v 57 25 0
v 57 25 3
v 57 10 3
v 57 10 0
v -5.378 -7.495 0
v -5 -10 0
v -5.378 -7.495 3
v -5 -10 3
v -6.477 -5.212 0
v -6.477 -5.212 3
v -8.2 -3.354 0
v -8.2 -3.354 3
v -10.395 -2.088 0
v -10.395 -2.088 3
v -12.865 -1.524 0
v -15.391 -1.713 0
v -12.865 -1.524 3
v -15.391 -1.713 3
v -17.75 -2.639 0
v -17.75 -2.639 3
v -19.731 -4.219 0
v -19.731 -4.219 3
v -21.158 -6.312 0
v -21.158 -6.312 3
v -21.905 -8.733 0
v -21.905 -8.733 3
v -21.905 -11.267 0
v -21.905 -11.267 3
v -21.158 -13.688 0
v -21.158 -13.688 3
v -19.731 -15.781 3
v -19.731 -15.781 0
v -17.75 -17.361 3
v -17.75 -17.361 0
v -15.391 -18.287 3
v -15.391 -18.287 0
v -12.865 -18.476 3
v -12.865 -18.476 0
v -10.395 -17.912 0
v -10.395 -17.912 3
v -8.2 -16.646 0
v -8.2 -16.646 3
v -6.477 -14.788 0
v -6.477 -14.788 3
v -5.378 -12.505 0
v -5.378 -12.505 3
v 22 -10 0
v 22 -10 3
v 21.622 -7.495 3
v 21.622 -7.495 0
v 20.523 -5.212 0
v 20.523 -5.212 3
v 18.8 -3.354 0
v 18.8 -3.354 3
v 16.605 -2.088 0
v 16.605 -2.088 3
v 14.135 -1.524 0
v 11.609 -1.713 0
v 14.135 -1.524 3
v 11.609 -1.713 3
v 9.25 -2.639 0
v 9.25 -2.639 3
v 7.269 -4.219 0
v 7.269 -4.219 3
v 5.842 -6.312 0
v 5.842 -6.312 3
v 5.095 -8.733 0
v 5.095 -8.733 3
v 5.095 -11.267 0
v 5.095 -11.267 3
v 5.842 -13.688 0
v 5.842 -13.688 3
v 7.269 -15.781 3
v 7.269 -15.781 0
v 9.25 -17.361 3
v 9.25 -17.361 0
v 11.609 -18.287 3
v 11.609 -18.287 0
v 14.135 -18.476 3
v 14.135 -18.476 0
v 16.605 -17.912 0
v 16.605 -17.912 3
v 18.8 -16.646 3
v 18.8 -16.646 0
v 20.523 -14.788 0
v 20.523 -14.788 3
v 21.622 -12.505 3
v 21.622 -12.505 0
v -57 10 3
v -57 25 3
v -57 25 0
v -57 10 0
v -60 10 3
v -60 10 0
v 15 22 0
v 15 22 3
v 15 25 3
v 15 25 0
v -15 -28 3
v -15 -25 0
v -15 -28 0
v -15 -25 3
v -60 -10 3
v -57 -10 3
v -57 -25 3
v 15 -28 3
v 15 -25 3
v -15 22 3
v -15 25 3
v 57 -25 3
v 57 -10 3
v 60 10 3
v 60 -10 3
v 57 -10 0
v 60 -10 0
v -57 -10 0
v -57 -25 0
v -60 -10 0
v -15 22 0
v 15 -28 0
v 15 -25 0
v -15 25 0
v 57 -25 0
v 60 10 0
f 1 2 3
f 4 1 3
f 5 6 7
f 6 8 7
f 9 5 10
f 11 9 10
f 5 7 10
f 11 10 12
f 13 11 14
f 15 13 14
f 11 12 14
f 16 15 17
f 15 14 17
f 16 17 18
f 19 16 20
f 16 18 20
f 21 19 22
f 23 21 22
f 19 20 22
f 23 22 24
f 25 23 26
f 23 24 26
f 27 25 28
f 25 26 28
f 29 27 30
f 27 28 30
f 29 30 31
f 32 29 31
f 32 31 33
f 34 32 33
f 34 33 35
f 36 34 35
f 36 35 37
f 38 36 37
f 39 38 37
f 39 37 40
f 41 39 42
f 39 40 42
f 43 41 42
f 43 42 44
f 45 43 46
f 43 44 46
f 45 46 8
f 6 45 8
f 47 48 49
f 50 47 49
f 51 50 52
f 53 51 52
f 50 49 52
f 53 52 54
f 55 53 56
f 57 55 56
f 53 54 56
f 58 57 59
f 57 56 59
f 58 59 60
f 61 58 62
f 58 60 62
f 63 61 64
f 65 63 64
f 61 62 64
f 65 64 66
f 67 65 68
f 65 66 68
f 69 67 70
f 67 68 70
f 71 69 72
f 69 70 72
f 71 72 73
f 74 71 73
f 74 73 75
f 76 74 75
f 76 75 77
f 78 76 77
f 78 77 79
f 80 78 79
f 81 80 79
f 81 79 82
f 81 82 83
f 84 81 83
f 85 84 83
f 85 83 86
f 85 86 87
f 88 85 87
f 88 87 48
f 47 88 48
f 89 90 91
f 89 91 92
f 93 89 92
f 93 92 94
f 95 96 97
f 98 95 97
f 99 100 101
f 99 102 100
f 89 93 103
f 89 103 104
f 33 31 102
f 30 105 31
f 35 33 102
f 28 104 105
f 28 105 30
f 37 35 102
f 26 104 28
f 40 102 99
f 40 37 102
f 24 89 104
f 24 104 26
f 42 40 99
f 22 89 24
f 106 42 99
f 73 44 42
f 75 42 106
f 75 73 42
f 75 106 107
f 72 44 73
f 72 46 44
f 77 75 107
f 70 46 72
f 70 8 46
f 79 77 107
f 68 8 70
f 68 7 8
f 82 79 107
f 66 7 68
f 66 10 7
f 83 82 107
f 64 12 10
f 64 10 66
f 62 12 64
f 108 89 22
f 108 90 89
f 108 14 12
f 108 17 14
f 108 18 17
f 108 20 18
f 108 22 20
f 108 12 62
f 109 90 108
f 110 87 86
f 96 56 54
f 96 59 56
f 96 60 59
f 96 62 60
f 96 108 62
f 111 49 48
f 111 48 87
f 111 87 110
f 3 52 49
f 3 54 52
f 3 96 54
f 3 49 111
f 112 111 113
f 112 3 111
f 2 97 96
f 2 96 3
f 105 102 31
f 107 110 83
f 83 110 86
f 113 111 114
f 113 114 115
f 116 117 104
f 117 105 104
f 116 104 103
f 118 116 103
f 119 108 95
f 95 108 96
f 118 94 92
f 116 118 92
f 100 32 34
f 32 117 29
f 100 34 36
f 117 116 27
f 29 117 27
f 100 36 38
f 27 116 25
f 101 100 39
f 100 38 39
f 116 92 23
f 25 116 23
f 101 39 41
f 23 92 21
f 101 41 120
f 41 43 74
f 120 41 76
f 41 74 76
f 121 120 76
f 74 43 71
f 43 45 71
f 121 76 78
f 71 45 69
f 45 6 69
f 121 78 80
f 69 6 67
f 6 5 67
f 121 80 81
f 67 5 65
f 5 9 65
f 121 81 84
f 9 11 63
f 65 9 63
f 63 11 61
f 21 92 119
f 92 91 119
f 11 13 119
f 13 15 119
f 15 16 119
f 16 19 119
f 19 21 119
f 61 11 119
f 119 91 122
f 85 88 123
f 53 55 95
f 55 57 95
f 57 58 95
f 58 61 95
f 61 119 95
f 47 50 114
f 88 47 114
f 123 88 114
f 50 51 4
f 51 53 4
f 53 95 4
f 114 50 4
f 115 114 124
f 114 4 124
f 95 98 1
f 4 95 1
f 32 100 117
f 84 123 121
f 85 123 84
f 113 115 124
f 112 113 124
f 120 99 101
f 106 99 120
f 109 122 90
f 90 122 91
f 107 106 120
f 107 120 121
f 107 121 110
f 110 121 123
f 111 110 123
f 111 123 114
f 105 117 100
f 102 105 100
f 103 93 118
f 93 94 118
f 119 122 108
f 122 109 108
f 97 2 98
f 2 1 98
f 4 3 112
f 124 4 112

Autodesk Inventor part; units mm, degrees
ref_plane "YZ Plane" through (0, 0, 0) normal (1, 0, 0) x (0, 1, 0)
ref_plane "XZ Plane" through (0, 0, 0) normal (0, 1, 0) x (-1, 0, 0)
ref_plane "XY Plane" through (0, 0, 0) normal (0, 0, 1) x (1, 0, 0)
sketch "스케치1" plane through (0, 0, 0) normal (0, 0, 1) x (1, 0, 0)
  line L0 (-60, -25) -> (60, -25)
  line L1 (60, -25) -> (60, 25)
  line L2 (60, 25) -> (-60, 25)
  line L3 (-60, 25) -> (-60, -25)
  line L4 (-60, -25) -> (60, 25) construction
  line L5 (60, -25) -> (-60, 25) construction
  point P0 (0, 0)
  dimension "d0" = 120
  dimension "d1" = 50
extrude "돌출1" add sketch "스케치1" along normal blind 3
sketch "스케치2" plane through (0, 0, 3) normal (0, 0, 1) x (1, 0, 0)
  line L0 (60, 25) -> (-60, 25) projected
  line L1 (60, 25) -> (57, 25)
  line L2 (57, 25) -> (57, 10)
  line L3 (57, 10) -> (60, 10)
  line L4 (60, 10) -> (60, 25)
  line L5 (-60, 0) -> (60, 0)
  line L6 (60, -25) -> (60, 25) projected
  line L7 (0, 25) -> (0, -25)
  line L8 (-60, -25) -> (60, -25) projected
  line L9 (60, -25) -> (57, -25)
  line L10 (57, -25) -> (57, -10)
  line L11 (57, -10) -> (60, -10)
  line L12 (60, -10) -> (60, -25)
  line L13 (-60, 25) -> (-57, 25)
  line L14 (-57, 25) -> (-57, 10)
  line L15 (-57, 10) -> (-60, 10)
  line L16 (-60, 10) -> (-60, 25)
  line L17 (-60, -25) -> (-57, -25)
  line L18 (-57, -25) -> (-57, -10)
  line L19 (-57, -10) -> (-60, -10)
  line L20 (-60, -10) -> (-60, -25)
  point P0 (0, 0)
  dimension "d4" = 3
  dimension "d5" = 15
extrude "돌출2" cut sketch "스케치2" against normal through all contours L4 L3 L2 L0 | L8 L20 L19 L18 | L14 L15 L16 L0 | L6 L8 L10 L11
sketch "스케치3" plane through (0, 0, 3) normal (0, 0, 1) x (1, 0, 0)
  line L0 (-15, 22) -> (15, 22)
  line L1 (15, 22) -> (15, 28)
  line L2 (15, 28) -> (-15, 28)
  line L3 (-15, 28) -> (-15, 22)
  line L4 (57, 25) -> (-57, 25) projected
  line L5 (-15, 22) -> (15, 28) construction
  line L6 (15, 22) -> (-15, 28) construction
  point P0 (0, 0)
  point P1 (0, 25)
  point P2 (15, 25)
  point P3 (-15, 25)
  dimension "d8" = 30
  dimension "d9" = 3
extrude "돌출3" cut sketch "스케치3" against normal through all contours L3 L4 L1 L0
sketch "스케치4" plane through (0, 0, 3) normal (0, 0, 1) x (1, 0, 0)
  line L0 (-15, -28) -> (15, -28)
  line L1 (15, -28) -> (15, -22)
  line L2 (15, -22) -> (-15, -22)
  line L3 (-15, -22) -> (-15, -28)
  line L4 (-57, -25) -> (57, -25) projected
  line L5 (-15, -28) -> (15, -22) construction
  line L6 (15, -28) -> (-15, -22) construction
  point P0 (0, 0)
  point P1 (0, -25)
  point P2 (15, -25)
  point P3 (-15, -25)
  dimension "d12" = 3
  dimension "d13" = 30
extrude "돌출4" add sketch "스케치4" against normal blind 3 contours L3 L4 L1 L0
sketch "스케치5" plane through (0, 0, 3) normal (0, 0, 1) x (1, 0, 0)
  circle A0 centre (-13.5, -10) radius 8.5
  circle A1 centre (13.5, -10) radius 8.5
  line L0 (15, -25) -> (57, -25) projected
  line L1 (-57, -25) -> (-15, -25) projected
  line L2 (60, -10) -> (60, 10) projected
  point P0 (0, 0)
  dimension "d16" = 27
  dimension "d18" = 17
  dimension "d19" = 17
  dimension "d22" = 15
  dimension "d23" = 15
  dimension "d24" = 46.5
extrude "돌출5" cut sketch "스케치5" against normal through all
sketch "스케치6" plane through (0, 0, 3) normal (0, 0, 1) x (1, 0, 0)
  point P0 (0, 0)
sketch "스케치7" plane through (0, 0, 3) normal (0, 0, 1) x (1, 0, 0)
  point P0 (0, 0)
properties part number "본체 겉면 레이저 앞판 수정"
